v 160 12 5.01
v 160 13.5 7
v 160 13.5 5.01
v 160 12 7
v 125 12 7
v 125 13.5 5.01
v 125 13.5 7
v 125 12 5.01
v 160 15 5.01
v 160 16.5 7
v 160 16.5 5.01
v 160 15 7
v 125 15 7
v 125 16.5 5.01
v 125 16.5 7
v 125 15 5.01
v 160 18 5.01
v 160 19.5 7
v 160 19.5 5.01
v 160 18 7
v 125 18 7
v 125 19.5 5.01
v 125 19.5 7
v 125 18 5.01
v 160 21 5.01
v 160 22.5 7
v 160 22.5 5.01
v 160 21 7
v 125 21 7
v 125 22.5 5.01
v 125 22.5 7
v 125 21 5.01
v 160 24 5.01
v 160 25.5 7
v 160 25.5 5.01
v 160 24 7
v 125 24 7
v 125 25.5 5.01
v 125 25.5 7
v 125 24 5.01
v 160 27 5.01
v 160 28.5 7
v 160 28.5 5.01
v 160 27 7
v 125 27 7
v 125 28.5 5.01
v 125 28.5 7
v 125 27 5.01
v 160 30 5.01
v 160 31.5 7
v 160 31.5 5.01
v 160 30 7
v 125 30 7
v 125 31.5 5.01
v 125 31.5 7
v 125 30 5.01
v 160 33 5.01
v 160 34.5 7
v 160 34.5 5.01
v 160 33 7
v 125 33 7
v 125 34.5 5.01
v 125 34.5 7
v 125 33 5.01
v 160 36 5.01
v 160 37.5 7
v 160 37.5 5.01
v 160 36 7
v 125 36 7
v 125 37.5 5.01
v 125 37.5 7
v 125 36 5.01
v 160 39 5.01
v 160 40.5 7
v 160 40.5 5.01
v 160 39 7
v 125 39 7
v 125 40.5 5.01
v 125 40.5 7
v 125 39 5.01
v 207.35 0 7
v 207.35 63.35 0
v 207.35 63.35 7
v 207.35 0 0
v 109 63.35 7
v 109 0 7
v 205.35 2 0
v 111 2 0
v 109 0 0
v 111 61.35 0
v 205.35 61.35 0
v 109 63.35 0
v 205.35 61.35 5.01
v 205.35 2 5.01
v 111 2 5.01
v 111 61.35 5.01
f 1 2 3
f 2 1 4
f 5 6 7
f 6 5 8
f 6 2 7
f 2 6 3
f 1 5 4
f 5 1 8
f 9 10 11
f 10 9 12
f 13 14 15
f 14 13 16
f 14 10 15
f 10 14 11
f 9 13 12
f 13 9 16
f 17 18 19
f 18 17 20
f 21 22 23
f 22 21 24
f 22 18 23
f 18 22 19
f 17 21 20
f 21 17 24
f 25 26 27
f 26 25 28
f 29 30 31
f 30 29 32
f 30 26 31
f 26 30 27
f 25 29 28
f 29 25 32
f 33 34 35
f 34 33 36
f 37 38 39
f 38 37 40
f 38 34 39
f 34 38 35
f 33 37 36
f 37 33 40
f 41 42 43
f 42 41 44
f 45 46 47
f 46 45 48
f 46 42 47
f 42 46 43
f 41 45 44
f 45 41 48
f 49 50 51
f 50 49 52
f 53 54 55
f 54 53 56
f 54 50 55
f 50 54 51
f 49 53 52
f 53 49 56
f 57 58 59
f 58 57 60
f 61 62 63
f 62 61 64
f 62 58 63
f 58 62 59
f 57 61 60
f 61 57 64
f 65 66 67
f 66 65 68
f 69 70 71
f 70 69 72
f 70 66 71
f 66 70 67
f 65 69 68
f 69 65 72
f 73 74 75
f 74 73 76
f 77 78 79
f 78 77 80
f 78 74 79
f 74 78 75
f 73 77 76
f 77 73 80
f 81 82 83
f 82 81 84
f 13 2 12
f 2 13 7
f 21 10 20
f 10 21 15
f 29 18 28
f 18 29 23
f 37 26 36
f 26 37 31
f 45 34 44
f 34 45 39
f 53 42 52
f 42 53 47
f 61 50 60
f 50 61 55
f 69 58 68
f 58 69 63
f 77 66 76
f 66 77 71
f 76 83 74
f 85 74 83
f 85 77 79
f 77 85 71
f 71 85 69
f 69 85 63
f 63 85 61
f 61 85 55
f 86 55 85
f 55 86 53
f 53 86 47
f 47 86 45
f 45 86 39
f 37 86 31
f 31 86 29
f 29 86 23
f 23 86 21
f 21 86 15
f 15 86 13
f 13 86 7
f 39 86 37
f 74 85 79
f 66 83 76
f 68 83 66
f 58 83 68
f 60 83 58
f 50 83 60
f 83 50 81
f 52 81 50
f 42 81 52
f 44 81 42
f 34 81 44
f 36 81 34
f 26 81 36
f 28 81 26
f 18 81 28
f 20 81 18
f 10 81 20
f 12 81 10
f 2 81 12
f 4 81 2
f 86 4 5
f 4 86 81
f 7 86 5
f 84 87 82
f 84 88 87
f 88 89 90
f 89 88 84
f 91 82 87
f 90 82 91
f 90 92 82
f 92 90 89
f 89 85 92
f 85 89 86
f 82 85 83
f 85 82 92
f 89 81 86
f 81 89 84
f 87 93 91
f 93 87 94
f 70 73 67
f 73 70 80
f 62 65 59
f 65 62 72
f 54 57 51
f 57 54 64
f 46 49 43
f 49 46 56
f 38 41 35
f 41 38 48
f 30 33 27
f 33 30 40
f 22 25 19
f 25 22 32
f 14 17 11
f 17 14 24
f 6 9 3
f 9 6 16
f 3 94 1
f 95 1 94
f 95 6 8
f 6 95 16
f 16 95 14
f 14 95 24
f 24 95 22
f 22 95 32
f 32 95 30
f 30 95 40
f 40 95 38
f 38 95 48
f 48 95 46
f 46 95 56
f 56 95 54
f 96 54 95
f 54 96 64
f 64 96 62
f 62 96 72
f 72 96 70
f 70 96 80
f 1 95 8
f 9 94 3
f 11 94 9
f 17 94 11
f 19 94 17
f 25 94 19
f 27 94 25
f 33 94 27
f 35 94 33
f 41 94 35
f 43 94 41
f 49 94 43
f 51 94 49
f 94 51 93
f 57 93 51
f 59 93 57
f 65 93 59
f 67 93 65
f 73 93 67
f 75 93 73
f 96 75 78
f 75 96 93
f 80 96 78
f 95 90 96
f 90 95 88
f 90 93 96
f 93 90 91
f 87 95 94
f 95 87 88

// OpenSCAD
$fn = 64;

// ---------------- Parameters ----------------
// Short wall is left
// Peg walls is top

inner_x = 90.0;          // INTERNAL width (inside-to-inside)
inner_y = 55.0;          // INTERNAL depth (inside-to-inside)

base_z  = 3.0;
wall_th = 2.0;
wall_h  = 14.5;

// top wall segment length measured on INSIDE edge
top_seg_inside_len = 31.0;

// pegs (offsets from INSIDE edges)
hole_d = 3.0;               // nominal screw hole dia you referenced
peg_d  = hole_d - 0.5;      // smooth movement
peg_h  = wall_h - 0.2;      // lid clearance

// Peg Shoulders
shoulder_d = hole_d + 3.0;
shoulder_h = 2.7;

// peg location using inside-top-left as reference
peg_x_from_inside_left = 6.2;
peg_y_from_inside_top  = 3.5;
peg_cc_y = 44.6;            // center-to-center spacing in Y

// Vents (lid)
vent_l = 35.0;              // length of each vent slot
vent_w = 1.5;               // width of each vent slot
vent_count = 10;            // number of vents
vent_x_from_inside_left = 14.0;
vent_y_from_inside_top  = 10.0;
vent_pitch = vent_w * 2;    // spacing between vents in Y

// Lid fit (OUTSIDE)
fit_clearance = 0.35;       // PETG outside slip/friction
lid_plate_th  = wall_th;    // same thickness as wall_th
lid_drop_h    = 5.0;        // skirt drop over outside walls

// Render toggles
show_base = false;
show_lid  = true;

// ---------------- Derived ----------------
outer_x = inner_x + 2*wall_th;   // 94.0
outer_y = inner_y + 2*wall_th;   // 59.0

inside_left_x = wall_th;         // 2.0
inside_top_y  = wall_th;         // 2.0

peg_xc = inside_left_x + peg_x_from_inside_left; // 8.2
peg_y1 = inside_top_y  + peg_y_from_inside_top;  // 8.2
peg_y2 = peg_y1 + peg_cc_y;                      // 52.8

// Convert inside segment length to outer segment length (segment starts at left)
top_seg_outer_len = top_seg_inside_len + wall_th; // 33.0

// ---------------- Modules ----------------
module base() {
  union() {
    // Base plate
    cube([outer_x, outer_y, base_z], center=false);

    // Walls on top of base: LEFT full, BOTTOM full, TOP segment
    translate([0, 0, base_z]) {
      // Left wall (full height)
      cube([wall_th, outer_y, wall_h], center=false);

      // Bottom wall (full width)
      translate([0, outer_y - wall_th, 0])
        cube([outer_x, wall_th, wall_h], center=false);

      // Top wall segment (from left)
      cube([top_seg_outer_len, wall_th, wall_h], center=false);
    }

    // Pegs for PCB location (on top of base)
    translate([0, 0, base_z]) {
      for (yy = [peg_y1, peg_y2]) {
        translate([peg_xc, yy, 0]) {
          // Bottom shoulder (board stop)
          cylinder(d=shoulder_d, h=shoulder_h);

          // Upper peg (alignment) on top of shoulder
          translate([0, 0, shoulder_h])
            cylinder(d=peg_d, h=peg_h - shoulder_h - wall_th);
        }
      }
    }
  }
}

module lid_with_vents_outside() {
  // Lid overall footprint (covers outer box with clearance)
  lid_outer_x = outer_x + fit_clearance + 2*wall_th;
  lid_outer_y = outer_y + fit_clearance + 2*wall_th;

  // Underside pocket leaves a skirt of thickness wall_th
  pocket_x = lid_outer_x - 2*wall_th;
  pocket_y = lid_outer_y - 2*wall_th;

  // Vent placement: user offsets are from INSIDE edges, so shift by wall_th
  vent_x0 = wall_th + vent_x_from_inside_left;
  vent_y0 = wall_th + vent_y_from_inside_top;

  difference() {
    // Solid lid volume: plate + skirt drop
    cube([lid_outer_x, lid_outer_y, lid_plate_th + lid_drop_h], center=false);

    // Pocket from underside to form skirt (do not cut into plate)
    translate([wall_th, wall_th, 0])
      cube([pocket_x, pocket_y, lid_drop_h + 0.01], center=false);

    // Vent slots cut through PLATE ONLY (plate starts at Z = lid_drop_h)
    for (i = [0 : vent_count - 1]) {
      translate([vent_x0, vent_y0 + i*vent_pitch, lid_drop_h])
        cube([vent_l, vent_w, lid_plate_th + 0.05], center=false);
    }
  }
}

// ---------------- Model ----------------
if (show_base)
  base();

if (show_lid)
  translate([outer_x + 15, 0, 0])
    lid_with_vents_outside();
